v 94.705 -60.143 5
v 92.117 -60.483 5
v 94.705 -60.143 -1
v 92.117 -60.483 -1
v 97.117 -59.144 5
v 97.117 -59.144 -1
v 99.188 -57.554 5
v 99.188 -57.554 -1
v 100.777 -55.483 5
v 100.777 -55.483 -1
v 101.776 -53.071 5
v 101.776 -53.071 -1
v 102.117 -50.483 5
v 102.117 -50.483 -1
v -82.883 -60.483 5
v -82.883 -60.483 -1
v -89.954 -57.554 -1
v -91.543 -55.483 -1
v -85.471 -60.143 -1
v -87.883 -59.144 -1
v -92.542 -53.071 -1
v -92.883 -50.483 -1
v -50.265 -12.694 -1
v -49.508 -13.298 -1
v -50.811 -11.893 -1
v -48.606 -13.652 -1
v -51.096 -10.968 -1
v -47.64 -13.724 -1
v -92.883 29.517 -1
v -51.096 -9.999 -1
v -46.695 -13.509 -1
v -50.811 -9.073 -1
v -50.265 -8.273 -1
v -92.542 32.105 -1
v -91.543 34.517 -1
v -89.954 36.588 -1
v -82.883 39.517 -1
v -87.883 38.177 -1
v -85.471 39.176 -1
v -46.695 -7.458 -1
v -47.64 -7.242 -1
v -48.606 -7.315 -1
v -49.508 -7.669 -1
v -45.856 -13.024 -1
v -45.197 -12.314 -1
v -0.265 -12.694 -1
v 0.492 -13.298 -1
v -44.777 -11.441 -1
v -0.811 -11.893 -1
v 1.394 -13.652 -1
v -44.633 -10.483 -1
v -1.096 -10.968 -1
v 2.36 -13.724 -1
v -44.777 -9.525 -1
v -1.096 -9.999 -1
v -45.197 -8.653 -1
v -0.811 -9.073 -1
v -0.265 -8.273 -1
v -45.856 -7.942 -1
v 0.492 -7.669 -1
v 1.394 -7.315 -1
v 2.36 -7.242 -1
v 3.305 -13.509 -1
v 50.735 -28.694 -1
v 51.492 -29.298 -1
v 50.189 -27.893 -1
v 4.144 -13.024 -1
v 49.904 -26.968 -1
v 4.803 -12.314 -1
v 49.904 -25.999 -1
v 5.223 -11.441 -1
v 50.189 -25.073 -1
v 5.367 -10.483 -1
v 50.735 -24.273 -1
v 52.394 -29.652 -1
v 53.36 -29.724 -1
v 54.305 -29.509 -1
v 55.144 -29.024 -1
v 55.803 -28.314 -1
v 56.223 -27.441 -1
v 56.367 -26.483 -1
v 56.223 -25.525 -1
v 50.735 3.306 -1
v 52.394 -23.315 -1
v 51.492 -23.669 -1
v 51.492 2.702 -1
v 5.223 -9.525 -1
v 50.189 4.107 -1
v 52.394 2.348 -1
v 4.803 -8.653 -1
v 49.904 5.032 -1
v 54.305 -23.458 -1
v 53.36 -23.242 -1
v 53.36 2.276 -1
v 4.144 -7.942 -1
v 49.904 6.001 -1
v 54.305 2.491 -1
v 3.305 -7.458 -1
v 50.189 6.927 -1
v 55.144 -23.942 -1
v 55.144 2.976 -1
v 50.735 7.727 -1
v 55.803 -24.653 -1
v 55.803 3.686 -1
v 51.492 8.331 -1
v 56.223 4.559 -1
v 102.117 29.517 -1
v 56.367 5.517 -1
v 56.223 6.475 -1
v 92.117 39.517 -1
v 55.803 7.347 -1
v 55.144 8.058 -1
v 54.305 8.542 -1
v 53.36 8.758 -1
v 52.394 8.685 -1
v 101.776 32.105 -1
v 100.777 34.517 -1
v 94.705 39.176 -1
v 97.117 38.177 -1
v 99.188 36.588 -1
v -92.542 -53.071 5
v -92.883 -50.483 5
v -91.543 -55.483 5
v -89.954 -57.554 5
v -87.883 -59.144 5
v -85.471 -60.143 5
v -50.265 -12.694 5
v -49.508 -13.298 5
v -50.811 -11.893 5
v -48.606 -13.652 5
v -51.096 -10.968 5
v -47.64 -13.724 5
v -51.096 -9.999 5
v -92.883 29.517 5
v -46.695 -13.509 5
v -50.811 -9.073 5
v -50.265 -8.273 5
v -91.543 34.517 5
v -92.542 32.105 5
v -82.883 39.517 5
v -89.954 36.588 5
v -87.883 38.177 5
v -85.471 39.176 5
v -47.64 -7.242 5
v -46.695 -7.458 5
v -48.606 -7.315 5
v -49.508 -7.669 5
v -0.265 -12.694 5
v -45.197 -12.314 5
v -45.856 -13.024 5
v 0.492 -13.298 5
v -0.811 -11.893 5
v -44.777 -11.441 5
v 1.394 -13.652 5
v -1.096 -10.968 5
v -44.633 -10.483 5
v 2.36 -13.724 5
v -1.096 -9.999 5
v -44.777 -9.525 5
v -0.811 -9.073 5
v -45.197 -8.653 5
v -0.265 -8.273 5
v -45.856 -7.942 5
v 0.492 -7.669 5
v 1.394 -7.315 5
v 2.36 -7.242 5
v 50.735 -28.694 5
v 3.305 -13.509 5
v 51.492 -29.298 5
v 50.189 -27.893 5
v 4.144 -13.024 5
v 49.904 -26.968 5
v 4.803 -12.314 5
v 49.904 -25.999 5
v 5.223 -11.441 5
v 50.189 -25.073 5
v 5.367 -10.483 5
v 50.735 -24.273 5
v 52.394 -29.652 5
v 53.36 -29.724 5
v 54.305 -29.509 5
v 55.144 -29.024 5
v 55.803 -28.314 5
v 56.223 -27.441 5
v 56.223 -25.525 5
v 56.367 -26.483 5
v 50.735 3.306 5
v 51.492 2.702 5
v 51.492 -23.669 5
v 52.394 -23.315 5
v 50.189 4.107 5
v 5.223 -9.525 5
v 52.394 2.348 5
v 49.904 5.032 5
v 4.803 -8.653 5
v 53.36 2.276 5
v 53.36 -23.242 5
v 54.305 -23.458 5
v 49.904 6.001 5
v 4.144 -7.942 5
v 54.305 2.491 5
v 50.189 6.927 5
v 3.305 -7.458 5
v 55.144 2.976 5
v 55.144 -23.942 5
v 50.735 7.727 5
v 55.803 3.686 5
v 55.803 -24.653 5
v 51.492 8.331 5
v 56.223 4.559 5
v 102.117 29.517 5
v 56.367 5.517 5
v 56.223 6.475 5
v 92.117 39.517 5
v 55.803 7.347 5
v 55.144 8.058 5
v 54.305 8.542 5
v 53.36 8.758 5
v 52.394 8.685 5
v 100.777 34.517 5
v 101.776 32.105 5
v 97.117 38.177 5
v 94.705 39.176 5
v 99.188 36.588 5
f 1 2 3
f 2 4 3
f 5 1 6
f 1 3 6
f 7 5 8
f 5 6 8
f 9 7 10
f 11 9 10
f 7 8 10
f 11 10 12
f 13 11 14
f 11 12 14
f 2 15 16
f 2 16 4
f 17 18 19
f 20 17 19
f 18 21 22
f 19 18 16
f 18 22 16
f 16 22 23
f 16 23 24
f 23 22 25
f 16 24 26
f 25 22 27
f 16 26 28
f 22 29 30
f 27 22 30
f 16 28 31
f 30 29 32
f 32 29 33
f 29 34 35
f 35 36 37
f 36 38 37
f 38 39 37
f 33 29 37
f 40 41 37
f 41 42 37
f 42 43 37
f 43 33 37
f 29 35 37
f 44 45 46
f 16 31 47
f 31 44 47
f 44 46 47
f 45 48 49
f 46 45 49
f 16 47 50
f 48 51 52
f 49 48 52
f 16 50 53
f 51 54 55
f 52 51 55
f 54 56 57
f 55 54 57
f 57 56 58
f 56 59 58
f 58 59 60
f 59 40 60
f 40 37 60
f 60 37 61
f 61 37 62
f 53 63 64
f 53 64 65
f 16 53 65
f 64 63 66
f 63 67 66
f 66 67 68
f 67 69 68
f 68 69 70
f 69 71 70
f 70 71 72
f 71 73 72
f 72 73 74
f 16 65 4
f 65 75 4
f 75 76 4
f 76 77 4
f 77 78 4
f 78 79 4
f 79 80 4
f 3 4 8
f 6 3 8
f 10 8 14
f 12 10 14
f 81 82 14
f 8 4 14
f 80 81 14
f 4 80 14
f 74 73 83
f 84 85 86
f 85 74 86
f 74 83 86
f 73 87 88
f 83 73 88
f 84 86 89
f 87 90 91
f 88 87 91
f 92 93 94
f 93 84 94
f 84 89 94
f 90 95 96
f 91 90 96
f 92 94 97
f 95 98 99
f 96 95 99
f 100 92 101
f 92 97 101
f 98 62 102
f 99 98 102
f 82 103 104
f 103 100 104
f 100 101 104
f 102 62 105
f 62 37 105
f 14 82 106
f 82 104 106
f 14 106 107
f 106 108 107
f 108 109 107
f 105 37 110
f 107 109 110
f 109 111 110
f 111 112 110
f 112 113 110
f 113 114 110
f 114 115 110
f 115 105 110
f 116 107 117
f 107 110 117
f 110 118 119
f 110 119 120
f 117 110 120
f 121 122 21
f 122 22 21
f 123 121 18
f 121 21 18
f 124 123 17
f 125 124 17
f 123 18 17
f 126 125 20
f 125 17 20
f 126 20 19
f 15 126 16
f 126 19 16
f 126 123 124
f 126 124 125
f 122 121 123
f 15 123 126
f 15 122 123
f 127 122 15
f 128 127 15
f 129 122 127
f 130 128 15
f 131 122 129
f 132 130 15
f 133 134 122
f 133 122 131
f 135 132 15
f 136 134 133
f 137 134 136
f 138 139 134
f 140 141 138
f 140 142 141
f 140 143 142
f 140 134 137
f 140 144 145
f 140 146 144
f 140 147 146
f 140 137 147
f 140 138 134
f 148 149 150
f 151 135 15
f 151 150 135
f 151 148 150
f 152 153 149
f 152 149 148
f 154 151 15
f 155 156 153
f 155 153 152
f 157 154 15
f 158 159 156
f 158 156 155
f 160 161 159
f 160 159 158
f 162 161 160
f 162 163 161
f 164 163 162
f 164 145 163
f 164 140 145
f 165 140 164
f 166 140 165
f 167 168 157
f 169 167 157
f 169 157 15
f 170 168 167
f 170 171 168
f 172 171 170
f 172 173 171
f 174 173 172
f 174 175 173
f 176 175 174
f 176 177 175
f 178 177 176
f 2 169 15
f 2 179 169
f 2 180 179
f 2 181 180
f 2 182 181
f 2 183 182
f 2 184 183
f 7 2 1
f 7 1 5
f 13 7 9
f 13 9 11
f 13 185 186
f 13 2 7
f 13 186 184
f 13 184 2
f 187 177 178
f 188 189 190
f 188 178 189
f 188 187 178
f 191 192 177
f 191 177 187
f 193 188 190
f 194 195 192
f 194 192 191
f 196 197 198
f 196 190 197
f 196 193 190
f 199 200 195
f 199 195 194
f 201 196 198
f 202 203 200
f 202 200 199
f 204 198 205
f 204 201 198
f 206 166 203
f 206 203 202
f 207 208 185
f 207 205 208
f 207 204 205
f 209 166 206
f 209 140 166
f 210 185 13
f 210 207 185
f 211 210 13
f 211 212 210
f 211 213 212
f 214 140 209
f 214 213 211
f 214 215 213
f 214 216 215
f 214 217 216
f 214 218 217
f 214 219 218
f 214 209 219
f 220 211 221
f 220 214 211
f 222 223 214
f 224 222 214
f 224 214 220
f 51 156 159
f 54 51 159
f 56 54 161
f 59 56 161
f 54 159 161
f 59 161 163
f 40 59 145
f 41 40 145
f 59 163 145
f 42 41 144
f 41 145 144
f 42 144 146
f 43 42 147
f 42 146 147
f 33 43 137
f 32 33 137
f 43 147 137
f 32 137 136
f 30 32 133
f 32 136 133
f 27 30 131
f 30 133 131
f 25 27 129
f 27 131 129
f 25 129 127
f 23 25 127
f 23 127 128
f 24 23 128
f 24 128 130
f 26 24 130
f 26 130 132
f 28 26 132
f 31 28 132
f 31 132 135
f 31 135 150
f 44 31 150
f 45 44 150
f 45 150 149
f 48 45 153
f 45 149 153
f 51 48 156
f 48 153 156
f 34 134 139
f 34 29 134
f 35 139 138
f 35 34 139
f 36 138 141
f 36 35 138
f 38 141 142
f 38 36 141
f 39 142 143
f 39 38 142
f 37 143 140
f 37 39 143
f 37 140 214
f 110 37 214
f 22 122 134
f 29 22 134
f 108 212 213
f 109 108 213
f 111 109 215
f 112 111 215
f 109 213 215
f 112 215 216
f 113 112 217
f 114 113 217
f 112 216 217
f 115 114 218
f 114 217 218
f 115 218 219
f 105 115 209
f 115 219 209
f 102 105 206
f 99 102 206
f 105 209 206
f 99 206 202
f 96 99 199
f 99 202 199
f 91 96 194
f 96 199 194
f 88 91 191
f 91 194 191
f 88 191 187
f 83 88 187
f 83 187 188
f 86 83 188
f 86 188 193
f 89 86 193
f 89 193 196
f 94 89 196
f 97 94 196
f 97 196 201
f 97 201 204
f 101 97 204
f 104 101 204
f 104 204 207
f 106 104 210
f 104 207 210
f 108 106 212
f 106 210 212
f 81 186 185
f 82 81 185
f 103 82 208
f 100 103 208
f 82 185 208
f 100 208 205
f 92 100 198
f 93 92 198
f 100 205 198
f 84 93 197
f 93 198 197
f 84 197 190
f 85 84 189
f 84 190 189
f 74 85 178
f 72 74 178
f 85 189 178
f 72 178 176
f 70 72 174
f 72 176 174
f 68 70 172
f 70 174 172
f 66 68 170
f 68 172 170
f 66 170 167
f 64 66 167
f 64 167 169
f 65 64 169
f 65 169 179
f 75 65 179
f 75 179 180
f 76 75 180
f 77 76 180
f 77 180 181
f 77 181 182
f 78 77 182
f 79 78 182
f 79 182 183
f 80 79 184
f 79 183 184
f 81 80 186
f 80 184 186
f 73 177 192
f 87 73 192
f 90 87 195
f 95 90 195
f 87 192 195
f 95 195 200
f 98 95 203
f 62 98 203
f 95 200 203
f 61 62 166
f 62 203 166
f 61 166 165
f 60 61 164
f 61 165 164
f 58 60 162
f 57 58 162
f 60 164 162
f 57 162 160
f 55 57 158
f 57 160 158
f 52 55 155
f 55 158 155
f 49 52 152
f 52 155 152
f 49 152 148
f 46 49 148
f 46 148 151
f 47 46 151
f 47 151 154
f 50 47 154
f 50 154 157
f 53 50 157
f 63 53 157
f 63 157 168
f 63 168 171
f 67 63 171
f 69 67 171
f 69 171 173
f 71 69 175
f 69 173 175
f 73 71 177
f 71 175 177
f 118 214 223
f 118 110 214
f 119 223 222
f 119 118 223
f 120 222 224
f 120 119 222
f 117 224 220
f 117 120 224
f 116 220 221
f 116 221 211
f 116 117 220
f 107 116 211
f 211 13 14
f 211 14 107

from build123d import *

# Parameters (mm, degrees)
SKETCH1_W           = 195
SKETCH1_H           = 100
SKETCH1_R           = 3.25
BOSS_EXTRUDE1_DEPTH = 6
FILLET1_R           = 10


with BuildPart() as part:
    # Sketch1 → Boss-Extrude1 (new body)
    with BuildSketch(Plane.XY.offset(5)):
        with Locations((4.617235872, -10.483294202)):
            Rectangle(SKETCH1_W, SKETCH1_H)
        with Locations((53.117235872, 5.516705798)):
            Circle(SKETCH1_R, mode=Mode.SUBTRACT)
        with Locations((53.117235872, -26.483294202)):
            Circle(SKETCH1_R, mode=Mode.SUBTRACT)
        with Locations((2.117235872, -10.483294202)):
            Circle(SKETCH1_R, mode=Mode.SUBTRACT)
        with Locations((-47.882764128, -10.483294202)):
            Circle(SKETCH1_R, mode=Mode.SUBTRACT)
    extrude(amount=-BOSS_EXTRUDE1_DEPTH)

    # Fillet1
    fillet1_edges = [part.edges().sort_by_distance(p)[0] for p in [
        (-92.882764128, -60.483294202, 2),
        (-92.882764128, 39.516705798, 2),
        (102.117235872, 39.516705798, 2),
        (102.117235872, -60.483294202, 2),
    ]]
    fillet(fillet1_edges, radius=FILLET1_R)


solid = part.part
